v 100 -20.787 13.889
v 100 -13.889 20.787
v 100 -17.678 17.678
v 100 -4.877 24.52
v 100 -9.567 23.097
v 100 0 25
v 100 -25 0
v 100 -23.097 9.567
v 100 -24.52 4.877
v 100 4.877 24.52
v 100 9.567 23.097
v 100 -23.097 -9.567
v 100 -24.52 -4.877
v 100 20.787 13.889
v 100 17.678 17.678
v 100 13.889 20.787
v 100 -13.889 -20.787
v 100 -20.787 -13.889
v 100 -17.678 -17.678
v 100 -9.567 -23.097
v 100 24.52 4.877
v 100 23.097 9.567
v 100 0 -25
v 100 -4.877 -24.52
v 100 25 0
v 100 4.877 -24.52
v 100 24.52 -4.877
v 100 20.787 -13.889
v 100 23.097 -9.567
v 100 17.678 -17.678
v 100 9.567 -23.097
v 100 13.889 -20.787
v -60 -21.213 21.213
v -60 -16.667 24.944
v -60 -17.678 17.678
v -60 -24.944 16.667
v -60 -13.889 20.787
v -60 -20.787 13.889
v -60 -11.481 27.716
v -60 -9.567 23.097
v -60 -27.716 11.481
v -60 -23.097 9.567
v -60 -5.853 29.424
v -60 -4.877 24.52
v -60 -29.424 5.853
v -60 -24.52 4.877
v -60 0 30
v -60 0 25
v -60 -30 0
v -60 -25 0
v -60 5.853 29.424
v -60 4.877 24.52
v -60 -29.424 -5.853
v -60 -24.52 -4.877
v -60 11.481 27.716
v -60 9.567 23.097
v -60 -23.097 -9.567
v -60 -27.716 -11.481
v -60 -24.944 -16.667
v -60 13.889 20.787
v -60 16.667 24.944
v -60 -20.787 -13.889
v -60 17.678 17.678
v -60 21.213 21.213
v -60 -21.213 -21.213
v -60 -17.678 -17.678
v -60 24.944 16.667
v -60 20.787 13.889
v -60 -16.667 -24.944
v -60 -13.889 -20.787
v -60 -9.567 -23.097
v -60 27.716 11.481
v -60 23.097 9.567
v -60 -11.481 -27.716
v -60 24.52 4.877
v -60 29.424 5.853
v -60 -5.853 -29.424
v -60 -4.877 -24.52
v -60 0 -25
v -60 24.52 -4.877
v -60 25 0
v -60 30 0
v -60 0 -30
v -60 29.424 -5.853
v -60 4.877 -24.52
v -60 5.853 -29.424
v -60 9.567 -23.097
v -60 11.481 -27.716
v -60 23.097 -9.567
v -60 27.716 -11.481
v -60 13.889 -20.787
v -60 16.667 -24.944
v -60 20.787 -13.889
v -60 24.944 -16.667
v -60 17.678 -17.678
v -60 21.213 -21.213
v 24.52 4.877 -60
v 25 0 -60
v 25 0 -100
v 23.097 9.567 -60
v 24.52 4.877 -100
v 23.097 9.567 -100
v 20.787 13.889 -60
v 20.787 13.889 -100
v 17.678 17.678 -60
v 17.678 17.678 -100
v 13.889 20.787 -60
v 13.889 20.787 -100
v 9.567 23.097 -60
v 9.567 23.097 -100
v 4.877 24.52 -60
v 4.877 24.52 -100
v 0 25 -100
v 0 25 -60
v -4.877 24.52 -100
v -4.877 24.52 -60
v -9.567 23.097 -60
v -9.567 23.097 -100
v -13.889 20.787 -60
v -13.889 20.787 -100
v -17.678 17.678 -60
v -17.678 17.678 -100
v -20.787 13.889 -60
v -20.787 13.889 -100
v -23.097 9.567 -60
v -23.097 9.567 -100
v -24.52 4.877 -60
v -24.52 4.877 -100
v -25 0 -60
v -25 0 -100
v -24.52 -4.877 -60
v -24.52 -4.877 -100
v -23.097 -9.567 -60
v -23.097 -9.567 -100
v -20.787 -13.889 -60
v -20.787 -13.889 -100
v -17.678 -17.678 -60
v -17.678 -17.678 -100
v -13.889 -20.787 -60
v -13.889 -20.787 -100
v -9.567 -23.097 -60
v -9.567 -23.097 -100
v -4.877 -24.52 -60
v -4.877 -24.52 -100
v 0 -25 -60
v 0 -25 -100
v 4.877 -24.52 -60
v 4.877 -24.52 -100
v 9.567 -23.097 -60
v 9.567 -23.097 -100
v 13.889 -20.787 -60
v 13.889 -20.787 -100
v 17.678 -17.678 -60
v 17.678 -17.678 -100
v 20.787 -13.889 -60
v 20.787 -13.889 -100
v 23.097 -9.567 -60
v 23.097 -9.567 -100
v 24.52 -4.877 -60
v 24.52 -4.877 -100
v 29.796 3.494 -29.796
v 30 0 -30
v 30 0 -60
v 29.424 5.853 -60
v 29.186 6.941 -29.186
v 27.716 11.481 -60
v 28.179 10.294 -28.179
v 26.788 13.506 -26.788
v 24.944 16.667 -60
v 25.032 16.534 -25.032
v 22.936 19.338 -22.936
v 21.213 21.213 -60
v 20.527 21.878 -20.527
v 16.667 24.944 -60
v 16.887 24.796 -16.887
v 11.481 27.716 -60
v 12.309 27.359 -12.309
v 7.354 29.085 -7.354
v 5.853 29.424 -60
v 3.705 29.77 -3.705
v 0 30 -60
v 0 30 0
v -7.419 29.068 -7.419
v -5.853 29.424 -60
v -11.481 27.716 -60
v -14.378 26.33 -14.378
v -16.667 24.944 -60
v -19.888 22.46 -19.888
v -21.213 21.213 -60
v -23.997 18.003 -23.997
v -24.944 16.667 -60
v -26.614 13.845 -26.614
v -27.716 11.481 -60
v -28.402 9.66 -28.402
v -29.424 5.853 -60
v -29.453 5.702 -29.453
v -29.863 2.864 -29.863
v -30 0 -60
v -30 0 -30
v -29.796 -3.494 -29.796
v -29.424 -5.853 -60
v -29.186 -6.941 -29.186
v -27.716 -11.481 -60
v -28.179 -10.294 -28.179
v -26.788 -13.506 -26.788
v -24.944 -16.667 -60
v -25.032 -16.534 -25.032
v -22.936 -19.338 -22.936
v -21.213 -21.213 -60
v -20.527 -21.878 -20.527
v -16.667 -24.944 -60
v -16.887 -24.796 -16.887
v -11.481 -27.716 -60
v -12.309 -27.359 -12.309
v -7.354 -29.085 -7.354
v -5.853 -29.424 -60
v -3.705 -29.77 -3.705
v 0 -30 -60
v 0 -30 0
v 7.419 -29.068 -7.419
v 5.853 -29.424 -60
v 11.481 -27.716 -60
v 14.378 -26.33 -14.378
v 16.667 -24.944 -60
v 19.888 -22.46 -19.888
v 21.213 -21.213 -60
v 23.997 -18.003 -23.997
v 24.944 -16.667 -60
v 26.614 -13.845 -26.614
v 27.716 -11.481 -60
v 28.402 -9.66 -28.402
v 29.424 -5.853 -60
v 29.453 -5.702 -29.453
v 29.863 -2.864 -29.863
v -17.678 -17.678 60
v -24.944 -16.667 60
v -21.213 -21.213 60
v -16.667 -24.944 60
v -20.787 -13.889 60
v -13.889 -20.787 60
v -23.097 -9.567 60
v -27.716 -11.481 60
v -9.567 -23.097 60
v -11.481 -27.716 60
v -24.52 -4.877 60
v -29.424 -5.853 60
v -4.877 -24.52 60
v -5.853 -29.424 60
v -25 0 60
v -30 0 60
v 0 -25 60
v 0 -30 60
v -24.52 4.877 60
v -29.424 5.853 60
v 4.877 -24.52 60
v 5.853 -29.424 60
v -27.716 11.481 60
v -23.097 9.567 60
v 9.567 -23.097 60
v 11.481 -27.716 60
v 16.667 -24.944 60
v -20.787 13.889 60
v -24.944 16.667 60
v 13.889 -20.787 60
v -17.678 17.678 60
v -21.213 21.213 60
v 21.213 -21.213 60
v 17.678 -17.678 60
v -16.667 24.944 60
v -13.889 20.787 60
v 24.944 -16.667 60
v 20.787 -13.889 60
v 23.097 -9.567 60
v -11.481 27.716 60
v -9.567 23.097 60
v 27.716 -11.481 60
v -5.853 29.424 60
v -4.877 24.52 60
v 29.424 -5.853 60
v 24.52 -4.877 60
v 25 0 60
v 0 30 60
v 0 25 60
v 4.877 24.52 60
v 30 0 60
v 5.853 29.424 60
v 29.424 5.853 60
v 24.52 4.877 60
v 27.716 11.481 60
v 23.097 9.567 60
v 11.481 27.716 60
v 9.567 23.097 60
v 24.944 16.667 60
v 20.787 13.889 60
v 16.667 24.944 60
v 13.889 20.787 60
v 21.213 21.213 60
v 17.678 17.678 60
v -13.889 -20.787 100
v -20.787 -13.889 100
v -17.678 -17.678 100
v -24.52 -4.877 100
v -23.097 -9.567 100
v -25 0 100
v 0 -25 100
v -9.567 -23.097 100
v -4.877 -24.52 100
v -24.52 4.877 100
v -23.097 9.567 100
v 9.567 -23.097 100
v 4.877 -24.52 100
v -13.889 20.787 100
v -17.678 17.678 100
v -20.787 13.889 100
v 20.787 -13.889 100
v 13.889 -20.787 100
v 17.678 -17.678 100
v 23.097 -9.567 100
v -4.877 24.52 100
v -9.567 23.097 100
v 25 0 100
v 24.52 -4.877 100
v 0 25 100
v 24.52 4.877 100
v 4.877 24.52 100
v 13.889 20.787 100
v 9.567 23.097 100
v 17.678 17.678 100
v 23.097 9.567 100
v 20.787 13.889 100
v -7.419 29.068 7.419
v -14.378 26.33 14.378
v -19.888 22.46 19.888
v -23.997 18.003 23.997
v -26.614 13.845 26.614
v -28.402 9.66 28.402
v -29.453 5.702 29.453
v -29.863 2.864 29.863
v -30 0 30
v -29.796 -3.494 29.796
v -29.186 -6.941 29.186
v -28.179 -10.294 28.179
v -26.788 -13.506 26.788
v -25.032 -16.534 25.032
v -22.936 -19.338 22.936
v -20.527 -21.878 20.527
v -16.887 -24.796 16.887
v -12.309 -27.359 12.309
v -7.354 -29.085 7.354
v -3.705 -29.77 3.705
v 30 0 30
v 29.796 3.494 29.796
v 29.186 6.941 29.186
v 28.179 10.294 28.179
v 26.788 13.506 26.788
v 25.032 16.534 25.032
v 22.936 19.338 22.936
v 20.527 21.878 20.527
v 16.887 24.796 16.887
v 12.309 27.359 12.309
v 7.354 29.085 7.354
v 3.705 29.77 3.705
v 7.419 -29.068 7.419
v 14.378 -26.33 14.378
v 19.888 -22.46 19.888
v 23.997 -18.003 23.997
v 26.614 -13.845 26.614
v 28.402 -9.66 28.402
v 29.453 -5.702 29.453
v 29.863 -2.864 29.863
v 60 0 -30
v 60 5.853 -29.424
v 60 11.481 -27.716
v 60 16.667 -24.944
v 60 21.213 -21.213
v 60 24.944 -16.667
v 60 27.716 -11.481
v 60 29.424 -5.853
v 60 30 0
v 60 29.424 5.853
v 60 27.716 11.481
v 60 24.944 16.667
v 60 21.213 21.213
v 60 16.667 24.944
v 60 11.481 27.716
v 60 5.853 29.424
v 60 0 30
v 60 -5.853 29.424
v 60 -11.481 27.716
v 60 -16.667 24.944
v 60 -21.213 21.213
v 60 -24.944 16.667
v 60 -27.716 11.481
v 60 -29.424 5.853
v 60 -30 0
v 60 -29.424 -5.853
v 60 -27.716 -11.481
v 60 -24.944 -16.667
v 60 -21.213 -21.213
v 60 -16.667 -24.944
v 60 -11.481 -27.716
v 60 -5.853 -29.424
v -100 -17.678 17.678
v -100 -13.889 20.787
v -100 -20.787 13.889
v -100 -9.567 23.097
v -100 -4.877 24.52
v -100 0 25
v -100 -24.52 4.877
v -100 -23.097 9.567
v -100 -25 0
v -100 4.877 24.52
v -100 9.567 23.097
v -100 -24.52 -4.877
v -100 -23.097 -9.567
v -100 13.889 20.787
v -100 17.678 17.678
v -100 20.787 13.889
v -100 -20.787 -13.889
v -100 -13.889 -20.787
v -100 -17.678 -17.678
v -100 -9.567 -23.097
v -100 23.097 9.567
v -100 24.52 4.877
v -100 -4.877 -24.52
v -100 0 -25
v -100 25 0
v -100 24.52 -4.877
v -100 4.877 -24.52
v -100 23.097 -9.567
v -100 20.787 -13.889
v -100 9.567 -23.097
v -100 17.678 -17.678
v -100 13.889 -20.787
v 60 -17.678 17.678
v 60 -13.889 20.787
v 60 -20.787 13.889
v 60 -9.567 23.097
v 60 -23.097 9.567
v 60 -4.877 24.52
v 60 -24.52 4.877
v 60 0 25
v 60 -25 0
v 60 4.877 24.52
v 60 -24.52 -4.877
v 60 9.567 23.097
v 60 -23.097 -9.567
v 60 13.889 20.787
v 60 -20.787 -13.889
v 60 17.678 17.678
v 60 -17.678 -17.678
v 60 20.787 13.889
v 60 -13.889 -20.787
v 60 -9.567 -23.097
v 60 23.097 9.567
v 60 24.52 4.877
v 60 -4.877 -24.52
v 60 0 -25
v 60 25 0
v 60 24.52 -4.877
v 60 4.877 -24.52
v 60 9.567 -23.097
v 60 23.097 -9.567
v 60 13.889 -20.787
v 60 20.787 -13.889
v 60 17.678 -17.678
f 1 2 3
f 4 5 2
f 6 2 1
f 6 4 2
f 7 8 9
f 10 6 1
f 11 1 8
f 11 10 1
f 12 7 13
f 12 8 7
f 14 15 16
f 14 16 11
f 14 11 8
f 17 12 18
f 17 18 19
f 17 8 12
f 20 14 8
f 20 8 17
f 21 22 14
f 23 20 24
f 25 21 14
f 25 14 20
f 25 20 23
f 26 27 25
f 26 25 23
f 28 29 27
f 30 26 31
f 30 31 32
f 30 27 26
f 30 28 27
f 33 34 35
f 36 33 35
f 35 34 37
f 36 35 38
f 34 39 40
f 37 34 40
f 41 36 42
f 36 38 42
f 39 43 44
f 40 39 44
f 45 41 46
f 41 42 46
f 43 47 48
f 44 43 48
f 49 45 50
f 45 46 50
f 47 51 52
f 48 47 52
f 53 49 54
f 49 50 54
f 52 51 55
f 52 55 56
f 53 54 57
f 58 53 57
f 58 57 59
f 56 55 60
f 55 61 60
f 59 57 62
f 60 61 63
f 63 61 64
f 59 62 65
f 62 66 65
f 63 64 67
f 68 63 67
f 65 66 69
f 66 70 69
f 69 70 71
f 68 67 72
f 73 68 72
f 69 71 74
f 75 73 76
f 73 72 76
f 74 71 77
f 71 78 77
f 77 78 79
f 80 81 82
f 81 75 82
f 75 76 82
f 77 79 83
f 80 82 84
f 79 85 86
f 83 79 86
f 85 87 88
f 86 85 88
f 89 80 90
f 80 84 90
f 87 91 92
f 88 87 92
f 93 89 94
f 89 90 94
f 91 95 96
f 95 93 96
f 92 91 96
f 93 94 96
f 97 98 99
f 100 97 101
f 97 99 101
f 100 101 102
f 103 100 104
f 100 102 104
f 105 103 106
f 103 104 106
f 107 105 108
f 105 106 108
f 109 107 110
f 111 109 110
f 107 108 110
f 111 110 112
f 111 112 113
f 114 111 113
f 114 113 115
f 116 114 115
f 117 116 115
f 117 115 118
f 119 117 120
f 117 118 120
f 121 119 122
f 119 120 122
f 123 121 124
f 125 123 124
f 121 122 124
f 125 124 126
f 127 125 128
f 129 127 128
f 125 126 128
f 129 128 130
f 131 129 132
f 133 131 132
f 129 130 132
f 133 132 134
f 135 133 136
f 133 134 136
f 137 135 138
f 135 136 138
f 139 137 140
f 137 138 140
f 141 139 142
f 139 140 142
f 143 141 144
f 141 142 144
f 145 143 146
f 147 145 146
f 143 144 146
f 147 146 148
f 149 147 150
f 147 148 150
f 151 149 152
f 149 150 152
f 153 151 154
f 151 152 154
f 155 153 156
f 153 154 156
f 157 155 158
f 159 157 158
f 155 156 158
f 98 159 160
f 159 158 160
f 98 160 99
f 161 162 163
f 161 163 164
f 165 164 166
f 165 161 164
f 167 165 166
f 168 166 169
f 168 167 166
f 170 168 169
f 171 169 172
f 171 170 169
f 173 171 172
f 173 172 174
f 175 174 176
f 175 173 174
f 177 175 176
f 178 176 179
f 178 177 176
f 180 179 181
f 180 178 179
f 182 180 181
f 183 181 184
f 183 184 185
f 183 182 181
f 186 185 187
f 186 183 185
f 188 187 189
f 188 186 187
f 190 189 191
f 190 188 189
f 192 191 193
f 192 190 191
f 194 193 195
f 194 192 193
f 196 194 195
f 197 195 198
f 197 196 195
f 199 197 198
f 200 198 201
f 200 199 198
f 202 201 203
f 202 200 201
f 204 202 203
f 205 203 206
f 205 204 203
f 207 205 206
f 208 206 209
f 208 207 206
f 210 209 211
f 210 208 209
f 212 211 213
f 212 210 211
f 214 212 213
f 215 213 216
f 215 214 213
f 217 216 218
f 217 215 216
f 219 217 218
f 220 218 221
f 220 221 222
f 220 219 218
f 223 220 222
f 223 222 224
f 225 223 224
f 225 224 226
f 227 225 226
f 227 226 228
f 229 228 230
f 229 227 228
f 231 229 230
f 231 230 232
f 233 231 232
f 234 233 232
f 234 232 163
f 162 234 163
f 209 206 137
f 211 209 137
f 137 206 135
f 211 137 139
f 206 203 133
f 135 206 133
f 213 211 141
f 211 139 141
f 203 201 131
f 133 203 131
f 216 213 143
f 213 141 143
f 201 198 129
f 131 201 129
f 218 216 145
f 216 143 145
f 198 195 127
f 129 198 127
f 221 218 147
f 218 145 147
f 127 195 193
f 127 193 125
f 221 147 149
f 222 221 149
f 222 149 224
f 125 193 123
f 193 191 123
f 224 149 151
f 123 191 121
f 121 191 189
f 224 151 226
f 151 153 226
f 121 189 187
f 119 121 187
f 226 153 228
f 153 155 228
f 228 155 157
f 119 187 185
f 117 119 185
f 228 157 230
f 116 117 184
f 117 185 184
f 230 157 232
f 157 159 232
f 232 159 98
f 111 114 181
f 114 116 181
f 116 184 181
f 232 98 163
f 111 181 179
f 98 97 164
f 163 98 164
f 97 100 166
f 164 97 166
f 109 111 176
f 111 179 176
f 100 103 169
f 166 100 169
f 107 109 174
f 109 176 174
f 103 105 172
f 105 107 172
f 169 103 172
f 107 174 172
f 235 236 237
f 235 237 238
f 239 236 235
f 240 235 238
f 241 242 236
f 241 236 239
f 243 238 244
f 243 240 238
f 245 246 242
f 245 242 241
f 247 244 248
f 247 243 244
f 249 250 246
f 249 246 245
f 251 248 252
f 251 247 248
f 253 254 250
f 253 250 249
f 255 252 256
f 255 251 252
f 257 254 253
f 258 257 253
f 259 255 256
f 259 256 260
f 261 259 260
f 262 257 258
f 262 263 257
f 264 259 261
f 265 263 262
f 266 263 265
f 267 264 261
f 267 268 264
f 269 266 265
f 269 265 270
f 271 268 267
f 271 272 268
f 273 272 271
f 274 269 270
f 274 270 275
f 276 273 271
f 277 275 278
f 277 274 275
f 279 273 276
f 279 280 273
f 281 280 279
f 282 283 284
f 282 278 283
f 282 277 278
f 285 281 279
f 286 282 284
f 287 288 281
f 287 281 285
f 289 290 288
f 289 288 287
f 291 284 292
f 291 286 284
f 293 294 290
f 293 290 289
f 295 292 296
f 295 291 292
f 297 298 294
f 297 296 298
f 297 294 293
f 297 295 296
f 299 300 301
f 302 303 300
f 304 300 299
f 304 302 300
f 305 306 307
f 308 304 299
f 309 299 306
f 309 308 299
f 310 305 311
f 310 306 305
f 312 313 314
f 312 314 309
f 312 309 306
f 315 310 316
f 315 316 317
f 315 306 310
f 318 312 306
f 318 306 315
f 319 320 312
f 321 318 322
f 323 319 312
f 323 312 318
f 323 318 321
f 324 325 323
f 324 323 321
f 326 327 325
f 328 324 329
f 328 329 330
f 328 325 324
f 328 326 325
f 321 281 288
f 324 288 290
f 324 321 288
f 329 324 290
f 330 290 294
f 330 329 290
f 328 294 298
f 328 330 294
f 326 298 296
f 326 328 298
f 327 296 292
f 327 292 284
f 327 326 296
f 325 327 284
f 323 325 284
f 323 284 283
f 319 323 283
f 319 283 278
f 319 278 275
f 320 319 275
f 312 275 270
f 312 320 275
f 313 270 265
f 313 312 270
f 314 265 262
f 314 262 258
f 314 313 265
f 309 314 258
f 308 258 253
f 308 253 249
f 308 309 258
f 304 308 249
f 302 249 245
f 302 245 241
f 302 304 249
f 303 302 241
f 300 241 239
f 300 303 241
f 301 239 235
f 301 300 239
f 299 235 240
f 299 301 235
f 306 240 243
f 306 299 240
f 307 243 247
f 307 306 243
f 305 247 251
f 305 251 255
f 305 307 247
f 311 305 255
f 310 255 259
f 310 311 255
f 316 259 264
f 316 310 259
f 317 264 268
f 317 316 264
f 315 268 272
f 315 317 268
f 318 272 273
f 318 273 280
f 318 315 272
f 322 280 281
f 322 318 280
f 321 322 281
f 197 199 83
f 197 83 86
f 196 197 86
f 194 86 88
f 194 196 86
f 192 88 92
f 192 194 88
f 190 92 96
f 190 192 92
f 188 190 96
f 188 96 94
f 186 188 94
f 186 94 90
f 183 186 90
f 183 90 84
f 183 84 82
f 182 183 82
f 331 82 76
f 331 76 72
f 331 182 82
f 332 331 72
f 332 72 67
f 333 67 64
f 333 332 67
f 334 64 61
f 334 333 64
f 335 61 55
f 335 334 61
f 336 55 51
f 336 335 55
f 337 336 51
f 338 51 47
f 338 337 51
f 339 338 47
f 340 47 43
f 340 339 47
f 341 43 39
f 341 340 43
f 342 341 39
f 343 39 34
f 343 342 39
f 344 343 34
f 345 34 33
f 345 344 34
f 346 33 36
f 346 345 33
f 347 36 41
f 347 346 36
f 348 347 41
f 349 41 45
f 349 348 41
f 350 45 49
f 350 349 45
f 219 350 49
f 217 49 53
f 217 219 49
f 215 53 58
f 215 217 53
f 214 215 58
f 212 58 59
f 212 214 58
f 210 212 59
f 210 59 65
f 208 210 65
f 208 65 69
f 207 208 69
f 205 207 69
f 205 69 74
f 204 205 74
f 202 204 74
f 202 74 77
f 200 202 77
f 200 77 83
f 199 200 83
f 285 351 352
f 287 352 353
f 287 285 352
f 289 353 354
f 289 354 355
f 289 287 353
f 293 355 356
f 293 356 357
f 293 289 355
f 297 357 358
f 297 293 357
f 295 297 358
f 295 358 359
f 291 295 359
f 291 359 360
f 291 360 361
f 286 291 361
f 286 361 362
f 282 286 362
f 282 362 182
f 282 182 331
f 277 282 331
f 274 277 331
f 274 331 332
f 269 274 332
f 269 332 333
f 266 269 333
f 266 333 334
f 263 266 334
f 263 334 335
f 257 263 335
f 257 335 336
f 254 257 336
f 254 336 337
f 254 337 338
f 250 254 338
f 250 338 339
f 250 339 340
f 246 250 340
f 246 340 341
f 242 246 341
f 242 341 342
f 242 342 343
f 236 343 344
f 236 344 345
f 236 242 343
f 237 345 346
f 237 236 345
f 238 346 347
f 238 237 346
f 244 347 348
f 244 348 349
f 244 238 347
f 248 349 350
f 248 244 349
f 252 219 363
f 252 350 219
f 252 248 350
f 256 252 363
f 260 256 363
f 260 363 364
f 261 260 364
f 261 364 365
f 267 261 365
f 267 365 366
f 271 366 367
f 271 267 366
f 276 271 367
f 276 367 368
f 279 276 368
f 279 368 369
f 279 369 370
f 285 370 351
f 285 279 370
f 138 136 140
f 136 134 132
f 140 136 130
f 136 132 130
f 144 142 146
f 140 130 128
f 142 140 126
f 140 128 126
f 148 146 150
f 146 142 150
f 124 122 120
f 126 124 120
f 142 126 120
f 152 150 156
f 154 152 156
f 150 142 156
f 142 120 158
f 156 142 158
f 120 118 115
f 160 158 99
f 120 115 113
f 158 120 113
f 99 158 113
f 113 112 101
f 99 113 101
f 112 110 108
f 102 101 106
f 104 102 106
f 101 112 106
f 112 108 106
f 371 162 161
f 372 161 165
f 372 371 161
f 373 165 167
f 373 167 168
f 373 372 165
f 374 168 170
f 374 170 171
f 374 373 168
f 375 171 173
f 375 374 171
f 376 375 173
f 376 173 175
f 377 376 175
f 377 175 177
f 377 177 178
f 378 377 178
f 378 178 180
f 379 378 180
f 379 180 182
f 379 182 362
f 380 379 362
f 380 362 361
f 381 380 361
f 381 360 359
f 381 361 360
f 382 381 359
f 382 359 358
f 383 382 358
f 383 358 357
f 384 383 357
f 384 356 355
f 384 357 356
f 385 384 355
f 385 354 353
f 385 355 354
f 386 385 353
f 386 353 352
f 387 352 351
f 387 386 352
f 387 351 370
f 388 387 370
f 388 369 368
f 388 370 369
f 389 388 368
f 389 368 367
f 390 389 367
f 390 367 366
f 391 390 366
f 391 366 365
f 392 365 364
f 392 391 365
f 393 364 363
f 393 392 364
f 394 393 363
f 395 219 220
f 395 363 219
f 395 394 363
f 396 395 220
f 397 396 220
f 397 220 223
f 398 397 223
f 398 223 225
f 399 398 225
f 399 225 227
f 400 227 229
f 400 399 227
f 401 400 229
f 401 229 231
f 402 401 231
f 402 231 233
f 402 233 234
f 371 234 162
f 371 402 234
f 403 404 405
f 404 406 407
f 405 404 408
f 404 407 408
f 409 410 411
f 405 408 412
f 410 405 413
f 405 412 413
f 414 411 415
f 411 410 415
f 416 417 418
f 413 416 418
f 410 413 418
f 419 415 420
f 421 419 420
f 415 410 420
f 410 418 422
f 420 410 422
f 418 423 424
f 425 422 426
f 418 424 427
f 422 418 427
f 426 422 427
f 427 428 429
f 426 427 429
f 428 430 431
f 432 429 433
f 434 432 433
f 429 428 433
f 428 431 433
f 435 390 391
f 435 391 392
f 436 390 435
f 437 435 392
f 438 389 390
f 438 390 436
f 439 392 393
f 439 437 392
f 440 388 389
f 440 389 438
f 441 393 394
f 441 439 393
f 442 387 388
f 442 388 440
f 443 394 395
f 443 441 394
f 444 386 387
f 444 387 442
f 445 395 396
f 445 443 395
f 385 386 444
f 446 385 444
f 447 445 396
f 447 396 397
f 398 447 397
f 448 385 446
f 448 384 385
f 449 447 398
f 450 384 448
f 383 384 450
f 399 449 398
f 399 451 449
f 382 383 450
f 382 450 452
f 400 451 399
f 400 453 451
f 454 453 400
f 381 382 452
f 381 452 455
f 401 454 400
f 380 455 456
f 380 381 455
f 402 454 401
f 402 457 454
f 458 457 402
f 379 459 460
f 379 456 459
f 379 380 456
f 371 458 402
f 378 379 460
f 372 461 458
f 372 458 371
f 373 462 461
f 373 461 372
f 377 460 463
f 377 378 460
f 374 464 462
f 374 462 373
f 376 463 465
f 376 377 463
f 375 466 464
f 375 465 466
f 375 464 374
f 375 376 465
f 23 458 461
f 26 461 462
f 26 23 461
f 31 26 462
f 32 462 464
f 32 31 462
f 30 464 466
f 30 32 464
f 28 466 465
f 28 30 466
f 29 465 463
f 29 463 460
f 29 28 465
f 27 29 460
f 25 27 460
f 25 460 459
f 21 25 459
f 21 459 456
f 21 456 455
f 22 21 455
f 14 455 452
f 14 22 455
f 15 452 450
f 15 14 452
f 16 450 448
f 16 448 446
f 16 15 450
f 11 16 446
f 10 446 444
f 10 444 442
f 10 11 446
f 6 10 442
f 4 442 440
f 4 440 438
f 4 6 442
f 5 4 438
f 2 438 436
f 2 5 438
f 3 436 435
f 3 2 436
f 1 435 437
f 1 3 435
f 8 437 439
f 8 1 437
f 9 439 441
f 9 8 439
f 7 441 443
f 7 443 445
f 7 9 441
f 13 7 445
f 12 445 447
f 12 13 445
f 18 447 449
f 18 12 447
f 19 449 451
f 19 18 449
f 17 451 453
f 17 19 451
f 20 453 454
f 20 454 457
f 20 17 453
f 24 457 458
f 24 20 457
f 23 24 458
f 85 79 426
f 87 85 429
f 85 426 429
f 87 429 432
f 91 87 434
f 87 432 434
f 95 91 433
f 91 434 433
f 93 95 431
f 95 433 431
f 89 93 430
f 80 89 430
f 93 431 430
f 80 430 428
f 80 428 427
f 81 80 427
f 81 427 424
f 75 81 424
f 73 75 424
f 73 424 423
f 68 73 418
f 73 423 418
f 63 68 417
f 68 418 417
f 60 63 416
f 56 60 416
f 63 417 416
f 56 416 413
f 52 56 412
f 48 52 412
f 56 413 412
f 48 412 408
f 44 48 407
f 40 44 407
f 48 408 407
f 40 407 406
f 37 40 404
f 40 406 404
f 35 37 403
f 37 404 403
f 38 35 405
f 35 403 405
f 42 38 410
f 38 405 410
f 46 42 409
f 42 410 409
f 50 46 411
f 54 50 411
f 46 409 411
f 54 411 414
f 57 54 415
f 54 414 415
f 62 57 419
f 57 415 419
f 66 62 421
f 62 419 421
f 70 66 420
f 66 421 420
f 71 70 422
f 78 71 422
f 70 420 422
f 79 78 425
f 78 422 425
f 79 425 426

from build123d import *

# Parameters (mm, degrees)
SKETCH1_R             = 30
BOSS_EXTRUDE1_DEPTH   = 100
SKETCH2_R             = 30
SKETCH2_R_2           = 25
CUT_EXTRUDE1_DEPTH    = 40
BODY_MOVE_COPY1_ANGLE = 90


with BuildPart() as part:
    # Sketch1 → Boss-Extrude1 (new, symmetric)
    with BuildSketch(Plane.XY):
        Circle(SKETCH1_R)
    extrude(amount=BOSS_EXTRUDE1_DEPTH, both=True)

    # Sketch2 → Cut-Extrude1 (cut)
    with BuildSketch(Plane.XY.offset(100)):
        Circle(SKETCH2_R)
        Circle(SKETCH2_R_2, mode=Mode.SUBTRACT)
    cut_extrude1 = extrude(amount=-CUT_EXTRUDE1_DEPTH, mode=Mode.SUBTRACT)

    # Mirror1: Cut-Extrude1 across plane
    add(cut_extrude1.mirror(Plane.XY), mode=Mode.SUBTRACT)


with BuildPart() as body_2:
    # Body-Move/Copy1: copy of part
    add(part.part.rotate(Axis((0, 0, 0), (0, 1, 0)), BODY_MOVE_COPY1_ANGLE))


with BuildPart() as part_1:
    add(part.part)

    # Combine1: union body 2
    add(body_2.part)


solid = part_1.part
